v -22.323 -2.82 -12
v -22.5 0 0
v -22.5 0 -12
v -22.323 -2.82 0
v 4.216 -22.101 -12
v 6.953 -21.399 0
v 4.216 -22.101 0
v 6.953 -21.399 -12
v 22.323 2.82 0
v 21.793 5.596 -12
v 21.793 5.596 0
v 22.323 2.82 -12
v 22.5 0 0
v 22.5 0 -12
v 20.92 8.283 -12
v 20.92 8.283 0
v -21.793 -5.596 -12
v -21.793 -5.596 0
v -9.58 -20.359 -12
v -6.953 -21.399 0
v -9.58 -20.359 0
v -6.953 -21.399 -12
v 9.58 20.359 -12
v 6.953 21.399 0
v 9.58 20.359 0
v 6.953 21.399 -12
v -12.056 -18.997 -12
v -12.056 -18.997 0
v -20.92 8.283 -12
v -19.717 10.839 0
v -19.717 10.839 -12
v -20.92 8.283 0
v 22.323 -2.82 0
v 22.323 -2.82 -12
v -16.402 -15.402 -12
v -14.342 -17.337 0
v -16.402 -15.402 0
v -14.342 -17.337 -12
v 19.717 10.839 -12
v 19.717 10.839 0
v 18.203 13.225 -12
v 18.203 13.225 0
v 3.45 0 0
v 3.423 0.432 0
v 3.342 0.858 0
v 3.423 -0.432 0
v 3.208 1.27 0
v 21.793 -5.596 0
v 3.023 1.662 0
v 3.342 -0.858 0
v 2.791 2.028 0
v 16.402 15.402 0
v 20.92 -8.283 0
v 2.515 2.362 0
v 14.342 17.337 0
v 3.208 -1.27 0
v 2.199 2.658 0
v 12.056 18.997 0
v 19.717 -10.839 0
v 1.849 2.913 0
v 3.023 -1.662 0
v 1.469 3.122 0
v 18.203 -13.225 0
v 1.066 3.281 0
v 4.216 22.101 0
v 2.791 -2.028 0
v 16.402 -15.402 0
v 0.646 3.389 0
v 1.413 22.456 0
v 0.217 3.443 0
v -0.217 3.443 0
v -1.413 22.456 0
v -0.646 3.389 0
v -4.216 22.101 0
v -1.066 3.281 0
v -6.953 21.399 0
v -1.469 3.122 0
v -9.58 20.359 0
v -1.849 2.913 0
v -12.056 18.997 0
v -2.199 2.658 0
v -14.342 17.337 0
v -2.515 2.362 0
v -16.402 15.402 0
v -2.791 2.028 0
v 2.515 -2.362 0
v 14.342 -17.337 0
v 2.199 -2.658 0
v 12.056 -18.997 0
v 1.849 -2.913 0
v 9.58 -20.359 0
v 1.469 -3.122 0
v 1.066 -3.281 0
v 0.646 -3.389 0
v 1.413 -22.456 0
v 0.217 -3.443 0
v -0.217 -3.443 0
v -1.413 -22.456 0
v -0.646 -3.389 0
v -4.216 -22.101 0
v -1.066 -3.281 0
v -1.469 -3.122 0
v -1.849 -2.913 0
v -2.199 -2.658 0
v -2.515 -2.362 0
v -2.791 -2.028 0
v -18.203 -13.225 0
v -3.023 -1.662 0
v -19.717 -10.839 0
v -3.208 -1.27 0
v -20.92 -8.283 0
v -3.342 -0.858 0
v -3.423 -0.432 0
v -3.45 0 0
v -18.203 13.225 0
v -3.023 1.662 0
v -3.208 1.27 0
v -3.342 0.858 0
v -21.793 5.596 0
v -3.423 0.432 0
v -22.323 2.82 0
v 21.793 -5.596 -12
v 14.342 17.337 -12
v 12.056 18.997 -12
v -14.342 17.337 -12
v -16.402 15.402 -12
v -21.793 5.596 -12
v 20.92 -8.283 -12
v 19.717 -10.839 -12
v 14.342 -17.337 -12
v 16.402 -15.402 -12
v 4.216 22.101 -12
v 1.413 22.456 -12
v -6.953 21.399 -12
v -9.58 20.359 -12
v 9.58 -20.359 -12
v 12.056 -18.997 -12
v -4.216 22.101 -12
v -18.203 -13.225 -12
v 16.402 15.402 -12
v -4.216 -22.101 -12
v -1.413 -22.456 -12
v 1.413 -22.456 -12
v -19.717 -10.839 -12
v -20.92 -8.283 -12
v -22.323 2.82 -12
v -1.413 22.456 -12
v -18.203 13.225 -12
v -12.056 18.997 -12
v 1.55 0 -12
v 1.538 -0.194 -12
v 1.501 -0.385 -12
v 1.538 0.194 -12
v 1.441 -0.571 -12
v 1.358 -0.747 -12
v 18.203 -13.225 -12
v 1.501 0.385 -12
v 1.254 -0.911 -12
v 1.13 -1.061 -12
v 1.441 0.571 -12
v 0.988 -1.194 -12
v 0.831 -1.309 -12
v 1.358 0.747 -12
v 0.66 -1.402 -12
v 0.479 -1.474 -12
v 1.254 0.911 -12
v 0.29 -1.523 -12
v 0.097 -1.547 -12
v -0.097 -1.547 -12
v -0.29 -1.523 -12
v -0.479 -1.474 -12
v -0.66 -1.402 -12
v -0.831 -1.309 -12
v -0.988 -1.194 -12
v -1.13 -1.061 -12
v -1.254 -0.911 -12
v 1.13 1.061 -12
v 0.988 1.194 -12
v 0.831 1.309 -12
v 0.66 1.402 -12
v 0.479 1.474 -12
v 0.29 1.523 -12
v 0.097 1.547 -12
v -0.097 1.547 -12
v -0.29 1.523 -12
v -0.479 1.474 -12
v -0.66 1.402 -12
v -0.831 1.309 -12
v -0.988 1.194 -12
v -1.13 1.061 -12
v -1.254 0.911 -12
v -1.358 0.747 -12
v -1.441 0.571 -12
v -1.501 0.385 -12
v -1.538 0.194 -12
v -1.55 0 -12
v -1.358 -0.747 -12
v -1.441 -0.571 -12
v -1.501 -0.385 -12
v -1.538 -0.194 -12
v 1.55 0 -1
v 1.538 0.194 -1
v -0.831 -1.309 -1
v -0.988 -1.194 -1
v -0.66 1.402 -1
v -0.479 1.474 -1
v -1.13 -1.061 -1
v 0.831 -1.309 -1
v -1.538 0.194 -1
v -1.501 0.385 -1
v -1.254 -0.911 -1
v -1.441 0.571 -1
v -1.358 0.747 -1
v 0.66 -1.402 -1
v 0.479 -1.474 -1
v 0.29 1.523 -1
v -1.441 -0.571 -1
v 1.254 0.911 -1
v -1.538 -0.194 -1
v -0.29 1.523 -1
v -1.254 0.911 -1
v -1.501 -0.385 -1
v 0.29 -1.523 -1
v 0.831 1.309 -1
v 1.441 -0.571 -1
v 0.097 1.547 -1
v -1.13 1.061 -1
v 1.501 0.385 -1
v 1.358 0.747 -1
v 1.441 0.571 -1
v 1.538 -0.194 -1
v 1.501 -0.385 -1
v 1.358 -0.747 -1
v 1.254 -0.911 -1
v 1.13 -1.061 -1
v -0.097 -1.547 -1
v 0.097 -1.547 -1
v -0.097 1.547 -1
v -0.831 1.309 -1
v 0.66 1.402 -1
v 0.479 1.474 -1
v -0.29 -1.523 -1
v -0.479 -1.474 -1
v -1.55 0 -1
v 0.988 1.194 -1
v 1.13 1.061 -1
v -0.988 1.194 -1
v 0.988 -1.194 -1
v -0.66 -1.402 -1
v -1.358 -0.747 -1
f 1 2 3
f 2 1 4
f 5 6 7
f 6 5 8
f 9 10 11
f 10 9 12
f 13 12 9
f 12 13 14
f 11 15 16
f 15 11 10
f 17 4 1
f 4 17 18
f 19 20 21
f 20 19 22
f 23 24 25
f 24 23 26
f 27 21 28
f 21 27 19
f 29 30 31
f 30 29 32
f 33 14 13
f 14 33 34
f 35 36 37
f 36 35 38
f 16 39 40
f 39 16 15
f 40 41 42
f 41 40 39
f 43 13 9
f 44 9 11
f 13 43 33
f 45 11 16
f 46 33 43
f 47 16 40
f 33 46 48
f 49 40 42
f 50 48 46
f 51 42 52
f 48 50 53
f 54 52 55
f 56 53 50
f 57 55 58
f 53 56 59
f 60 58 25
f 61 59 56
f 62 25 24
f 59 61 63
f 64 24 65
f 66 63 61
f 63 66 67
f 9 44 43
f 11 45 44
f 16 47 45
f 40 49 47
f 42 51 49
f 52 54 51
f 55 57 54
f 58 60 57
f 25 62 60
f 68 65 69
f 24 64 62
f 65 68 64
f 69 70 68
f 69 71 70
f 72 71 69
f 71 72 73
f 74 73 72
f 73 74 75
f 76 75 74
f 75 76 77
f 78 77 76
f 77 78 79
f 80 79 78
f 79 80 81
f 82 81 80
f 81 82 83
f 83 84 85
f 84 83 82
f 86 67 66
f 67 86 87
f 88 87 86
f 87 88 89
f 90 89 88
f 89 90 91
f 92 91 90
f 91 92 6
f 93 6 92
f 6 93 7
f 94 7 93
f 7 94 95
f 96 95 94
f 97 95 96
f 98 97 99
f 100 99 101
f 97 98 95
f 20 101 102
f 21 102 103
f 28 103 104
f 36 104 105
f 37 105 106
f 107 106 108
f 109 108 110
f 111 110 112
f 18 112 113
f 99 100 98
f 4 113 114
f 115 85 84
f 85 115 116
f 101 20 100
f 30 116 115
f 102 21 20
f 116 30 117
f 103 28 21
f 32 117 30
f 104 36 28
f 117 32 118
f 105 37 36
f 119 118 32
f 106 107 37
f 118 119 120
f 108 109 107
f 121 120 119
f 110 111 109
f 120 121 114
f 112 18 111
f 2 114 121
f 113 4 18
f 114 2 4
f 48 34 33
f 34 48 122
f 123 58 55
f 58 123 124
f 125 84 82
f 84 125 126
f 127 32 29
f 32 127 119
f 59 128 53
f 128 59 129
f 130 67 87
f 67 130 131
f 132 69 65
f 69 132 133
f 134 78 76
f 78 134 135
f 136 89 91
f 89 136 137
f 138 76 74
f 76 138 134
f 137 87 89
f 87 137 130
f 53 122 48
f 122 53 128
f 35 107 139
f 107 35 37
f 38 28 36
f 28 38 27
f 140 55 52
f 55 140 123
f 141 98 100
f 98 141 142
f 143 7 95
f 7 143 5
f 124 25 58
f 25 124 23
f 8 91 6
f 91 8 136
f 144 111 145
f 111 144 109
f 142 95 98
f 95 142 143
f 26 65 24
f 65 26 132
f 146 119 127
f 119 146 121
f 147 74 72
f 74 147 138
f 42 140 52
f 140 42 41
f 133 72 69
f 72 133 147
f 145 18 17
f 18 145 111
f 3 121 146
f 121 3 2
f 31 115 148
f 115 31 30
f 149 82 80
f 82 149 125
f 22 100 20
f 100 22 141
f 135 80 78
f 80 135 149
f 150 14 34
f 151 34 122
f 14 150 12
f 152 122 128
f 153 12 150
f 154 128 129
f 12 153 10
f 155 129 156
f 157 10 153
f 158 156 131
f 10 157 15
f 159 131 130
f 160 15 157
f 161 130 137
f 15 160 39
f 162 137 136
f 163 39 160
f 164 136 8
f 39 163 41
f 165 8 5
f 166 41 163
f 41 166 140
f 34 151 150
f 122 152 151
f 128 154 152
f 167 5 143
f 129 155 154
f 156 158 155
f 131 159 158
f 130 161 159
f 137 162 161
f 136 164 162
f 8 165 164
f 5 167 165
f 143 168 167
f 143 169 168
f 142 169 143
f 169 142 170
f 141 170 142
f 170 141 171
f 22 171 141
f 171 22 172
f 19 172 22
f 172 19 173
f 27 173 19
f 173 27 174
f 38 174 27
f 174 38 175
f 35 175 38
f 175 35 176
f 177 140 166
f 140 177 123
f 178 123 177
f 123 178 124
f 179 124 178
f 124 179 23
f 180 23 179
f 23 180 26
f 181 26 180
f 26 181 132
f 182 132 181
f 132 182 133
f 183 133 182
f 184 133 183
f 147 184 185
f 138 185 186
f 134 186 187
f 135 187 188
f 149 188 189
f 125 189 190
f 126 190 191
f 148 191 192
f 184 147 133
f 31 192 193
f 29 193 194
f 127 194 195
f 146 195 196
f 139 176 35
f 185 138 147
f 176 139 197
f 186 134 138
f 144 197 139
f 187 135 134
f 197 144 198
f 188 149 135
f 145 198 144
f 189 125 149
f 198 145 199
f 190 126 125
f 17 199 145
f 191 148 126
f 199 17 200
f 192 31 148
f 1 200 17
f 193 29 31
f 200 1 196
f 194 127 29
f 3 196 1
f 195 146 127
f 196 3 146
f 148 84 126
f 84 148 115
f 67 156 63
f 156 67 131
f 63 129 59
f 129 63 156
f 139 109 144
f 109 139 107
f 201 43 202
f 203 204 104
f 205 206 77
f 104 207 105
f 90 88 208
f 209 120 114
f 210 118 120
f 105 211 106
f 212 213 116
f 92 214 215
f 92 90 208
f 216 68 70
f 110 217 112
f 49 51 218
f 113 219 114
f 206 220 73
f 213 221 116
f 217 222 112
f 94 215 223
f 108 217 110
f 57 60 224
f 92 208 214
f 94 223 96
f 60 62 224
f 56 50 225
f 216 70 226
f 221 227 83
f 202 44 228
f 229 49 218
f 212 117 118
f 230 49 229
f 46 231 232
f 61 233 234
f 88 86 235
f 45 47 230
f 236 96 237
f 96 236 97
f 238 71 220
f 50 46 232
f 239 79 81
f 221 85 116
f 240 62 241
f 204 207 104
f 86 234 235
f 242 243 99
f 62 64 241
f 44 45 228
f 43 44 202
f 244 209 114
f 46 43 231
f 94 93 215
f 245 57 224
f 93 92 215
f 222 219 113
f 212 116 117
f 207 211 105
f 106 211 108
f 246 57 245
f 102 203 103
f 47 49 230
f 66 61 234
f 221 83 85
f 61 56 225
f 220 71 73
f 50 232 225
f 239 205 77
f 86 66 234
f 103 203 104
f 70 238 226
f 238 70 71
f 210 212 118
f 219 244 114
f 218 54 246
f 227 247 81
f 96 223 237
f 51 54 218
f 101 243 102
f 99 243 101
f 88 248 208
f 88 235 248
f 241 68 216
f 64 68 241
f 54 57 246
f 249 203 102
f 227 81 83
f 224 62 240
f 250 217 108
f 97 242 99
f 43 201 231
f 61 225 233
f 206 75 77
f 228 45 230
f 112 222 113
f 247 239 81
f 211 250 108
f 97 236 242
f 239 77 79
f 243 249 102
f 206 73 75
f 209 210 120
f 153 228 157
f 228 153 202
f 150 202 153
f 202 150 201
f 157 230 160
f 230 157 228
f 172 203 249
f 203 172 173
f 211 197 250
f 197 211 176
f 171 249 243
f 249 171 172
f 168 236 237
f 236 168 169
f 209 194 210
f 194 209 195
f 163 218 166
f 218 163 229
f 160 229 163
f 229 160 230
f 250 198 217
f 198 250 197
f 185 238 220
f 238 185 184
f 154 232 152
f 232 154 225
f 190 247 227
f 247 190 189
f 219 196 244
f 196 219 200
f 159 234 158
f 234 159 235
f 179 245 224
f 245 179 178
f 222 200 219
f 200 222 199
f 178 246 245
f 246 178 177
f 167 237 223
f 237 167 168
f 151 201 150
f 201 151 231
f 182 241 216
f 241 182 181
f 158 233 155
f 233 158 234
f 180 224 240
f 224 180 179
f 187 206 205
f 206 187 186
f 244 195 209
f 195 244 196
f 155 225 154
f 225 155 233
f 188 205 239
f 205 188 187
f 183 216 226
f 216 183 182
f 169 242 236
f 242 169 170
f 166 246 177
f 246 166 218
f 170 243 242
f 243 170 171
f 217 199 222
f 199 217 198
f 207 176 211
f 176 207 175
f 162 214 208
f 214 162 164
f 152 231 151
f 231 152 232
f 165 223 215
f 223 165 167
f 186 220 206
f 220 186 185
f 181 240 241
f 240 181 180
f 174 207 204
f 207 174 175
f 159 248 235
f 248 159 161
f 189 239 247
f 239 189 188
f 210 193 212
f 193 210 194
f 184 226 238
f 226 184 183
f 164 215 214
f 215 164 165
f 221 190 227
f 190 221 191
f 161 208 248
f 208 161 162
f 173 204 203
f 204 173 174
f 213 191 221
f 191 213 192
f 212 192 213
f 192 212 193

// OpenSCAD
$fn = 50;


difference() {
	union() {
		translate(v = [0, 0, -12.0000000000]) {
			cylinder(h = 12, r = 22.5000000000);
		}
		translate(v = [0, 0, -12.0000000000]) {
			cylinder(h = 12, r = 2.8750000000);
		}
	}
	union() {
		translate(v = [0, 0, 0]) {
			rotate(a = [0, 0, 0]) {
				difference() {
					union() {
						translate(v = [0, 0, -12.0000000000]) {
							cylinder(h = 12, r = 1.2500000000);
						}
						translate(v = [0, 0, -1.0000000000]) {
							cylinder(h = 1.0000000000, r1 = 1.5500000000, r2 = 3.4500000000);
						}
						translate(v = [0, 0, -12.0000000000]) {
							cylinder(h = 12, r = 1.5500000000);
						}
						translate(v = [0, 0, -12.0000000000]) {
							cylinder(h = 12, r = 1.2500000000);
						}
					}
					union();
				}
			}
		}
	}
}
